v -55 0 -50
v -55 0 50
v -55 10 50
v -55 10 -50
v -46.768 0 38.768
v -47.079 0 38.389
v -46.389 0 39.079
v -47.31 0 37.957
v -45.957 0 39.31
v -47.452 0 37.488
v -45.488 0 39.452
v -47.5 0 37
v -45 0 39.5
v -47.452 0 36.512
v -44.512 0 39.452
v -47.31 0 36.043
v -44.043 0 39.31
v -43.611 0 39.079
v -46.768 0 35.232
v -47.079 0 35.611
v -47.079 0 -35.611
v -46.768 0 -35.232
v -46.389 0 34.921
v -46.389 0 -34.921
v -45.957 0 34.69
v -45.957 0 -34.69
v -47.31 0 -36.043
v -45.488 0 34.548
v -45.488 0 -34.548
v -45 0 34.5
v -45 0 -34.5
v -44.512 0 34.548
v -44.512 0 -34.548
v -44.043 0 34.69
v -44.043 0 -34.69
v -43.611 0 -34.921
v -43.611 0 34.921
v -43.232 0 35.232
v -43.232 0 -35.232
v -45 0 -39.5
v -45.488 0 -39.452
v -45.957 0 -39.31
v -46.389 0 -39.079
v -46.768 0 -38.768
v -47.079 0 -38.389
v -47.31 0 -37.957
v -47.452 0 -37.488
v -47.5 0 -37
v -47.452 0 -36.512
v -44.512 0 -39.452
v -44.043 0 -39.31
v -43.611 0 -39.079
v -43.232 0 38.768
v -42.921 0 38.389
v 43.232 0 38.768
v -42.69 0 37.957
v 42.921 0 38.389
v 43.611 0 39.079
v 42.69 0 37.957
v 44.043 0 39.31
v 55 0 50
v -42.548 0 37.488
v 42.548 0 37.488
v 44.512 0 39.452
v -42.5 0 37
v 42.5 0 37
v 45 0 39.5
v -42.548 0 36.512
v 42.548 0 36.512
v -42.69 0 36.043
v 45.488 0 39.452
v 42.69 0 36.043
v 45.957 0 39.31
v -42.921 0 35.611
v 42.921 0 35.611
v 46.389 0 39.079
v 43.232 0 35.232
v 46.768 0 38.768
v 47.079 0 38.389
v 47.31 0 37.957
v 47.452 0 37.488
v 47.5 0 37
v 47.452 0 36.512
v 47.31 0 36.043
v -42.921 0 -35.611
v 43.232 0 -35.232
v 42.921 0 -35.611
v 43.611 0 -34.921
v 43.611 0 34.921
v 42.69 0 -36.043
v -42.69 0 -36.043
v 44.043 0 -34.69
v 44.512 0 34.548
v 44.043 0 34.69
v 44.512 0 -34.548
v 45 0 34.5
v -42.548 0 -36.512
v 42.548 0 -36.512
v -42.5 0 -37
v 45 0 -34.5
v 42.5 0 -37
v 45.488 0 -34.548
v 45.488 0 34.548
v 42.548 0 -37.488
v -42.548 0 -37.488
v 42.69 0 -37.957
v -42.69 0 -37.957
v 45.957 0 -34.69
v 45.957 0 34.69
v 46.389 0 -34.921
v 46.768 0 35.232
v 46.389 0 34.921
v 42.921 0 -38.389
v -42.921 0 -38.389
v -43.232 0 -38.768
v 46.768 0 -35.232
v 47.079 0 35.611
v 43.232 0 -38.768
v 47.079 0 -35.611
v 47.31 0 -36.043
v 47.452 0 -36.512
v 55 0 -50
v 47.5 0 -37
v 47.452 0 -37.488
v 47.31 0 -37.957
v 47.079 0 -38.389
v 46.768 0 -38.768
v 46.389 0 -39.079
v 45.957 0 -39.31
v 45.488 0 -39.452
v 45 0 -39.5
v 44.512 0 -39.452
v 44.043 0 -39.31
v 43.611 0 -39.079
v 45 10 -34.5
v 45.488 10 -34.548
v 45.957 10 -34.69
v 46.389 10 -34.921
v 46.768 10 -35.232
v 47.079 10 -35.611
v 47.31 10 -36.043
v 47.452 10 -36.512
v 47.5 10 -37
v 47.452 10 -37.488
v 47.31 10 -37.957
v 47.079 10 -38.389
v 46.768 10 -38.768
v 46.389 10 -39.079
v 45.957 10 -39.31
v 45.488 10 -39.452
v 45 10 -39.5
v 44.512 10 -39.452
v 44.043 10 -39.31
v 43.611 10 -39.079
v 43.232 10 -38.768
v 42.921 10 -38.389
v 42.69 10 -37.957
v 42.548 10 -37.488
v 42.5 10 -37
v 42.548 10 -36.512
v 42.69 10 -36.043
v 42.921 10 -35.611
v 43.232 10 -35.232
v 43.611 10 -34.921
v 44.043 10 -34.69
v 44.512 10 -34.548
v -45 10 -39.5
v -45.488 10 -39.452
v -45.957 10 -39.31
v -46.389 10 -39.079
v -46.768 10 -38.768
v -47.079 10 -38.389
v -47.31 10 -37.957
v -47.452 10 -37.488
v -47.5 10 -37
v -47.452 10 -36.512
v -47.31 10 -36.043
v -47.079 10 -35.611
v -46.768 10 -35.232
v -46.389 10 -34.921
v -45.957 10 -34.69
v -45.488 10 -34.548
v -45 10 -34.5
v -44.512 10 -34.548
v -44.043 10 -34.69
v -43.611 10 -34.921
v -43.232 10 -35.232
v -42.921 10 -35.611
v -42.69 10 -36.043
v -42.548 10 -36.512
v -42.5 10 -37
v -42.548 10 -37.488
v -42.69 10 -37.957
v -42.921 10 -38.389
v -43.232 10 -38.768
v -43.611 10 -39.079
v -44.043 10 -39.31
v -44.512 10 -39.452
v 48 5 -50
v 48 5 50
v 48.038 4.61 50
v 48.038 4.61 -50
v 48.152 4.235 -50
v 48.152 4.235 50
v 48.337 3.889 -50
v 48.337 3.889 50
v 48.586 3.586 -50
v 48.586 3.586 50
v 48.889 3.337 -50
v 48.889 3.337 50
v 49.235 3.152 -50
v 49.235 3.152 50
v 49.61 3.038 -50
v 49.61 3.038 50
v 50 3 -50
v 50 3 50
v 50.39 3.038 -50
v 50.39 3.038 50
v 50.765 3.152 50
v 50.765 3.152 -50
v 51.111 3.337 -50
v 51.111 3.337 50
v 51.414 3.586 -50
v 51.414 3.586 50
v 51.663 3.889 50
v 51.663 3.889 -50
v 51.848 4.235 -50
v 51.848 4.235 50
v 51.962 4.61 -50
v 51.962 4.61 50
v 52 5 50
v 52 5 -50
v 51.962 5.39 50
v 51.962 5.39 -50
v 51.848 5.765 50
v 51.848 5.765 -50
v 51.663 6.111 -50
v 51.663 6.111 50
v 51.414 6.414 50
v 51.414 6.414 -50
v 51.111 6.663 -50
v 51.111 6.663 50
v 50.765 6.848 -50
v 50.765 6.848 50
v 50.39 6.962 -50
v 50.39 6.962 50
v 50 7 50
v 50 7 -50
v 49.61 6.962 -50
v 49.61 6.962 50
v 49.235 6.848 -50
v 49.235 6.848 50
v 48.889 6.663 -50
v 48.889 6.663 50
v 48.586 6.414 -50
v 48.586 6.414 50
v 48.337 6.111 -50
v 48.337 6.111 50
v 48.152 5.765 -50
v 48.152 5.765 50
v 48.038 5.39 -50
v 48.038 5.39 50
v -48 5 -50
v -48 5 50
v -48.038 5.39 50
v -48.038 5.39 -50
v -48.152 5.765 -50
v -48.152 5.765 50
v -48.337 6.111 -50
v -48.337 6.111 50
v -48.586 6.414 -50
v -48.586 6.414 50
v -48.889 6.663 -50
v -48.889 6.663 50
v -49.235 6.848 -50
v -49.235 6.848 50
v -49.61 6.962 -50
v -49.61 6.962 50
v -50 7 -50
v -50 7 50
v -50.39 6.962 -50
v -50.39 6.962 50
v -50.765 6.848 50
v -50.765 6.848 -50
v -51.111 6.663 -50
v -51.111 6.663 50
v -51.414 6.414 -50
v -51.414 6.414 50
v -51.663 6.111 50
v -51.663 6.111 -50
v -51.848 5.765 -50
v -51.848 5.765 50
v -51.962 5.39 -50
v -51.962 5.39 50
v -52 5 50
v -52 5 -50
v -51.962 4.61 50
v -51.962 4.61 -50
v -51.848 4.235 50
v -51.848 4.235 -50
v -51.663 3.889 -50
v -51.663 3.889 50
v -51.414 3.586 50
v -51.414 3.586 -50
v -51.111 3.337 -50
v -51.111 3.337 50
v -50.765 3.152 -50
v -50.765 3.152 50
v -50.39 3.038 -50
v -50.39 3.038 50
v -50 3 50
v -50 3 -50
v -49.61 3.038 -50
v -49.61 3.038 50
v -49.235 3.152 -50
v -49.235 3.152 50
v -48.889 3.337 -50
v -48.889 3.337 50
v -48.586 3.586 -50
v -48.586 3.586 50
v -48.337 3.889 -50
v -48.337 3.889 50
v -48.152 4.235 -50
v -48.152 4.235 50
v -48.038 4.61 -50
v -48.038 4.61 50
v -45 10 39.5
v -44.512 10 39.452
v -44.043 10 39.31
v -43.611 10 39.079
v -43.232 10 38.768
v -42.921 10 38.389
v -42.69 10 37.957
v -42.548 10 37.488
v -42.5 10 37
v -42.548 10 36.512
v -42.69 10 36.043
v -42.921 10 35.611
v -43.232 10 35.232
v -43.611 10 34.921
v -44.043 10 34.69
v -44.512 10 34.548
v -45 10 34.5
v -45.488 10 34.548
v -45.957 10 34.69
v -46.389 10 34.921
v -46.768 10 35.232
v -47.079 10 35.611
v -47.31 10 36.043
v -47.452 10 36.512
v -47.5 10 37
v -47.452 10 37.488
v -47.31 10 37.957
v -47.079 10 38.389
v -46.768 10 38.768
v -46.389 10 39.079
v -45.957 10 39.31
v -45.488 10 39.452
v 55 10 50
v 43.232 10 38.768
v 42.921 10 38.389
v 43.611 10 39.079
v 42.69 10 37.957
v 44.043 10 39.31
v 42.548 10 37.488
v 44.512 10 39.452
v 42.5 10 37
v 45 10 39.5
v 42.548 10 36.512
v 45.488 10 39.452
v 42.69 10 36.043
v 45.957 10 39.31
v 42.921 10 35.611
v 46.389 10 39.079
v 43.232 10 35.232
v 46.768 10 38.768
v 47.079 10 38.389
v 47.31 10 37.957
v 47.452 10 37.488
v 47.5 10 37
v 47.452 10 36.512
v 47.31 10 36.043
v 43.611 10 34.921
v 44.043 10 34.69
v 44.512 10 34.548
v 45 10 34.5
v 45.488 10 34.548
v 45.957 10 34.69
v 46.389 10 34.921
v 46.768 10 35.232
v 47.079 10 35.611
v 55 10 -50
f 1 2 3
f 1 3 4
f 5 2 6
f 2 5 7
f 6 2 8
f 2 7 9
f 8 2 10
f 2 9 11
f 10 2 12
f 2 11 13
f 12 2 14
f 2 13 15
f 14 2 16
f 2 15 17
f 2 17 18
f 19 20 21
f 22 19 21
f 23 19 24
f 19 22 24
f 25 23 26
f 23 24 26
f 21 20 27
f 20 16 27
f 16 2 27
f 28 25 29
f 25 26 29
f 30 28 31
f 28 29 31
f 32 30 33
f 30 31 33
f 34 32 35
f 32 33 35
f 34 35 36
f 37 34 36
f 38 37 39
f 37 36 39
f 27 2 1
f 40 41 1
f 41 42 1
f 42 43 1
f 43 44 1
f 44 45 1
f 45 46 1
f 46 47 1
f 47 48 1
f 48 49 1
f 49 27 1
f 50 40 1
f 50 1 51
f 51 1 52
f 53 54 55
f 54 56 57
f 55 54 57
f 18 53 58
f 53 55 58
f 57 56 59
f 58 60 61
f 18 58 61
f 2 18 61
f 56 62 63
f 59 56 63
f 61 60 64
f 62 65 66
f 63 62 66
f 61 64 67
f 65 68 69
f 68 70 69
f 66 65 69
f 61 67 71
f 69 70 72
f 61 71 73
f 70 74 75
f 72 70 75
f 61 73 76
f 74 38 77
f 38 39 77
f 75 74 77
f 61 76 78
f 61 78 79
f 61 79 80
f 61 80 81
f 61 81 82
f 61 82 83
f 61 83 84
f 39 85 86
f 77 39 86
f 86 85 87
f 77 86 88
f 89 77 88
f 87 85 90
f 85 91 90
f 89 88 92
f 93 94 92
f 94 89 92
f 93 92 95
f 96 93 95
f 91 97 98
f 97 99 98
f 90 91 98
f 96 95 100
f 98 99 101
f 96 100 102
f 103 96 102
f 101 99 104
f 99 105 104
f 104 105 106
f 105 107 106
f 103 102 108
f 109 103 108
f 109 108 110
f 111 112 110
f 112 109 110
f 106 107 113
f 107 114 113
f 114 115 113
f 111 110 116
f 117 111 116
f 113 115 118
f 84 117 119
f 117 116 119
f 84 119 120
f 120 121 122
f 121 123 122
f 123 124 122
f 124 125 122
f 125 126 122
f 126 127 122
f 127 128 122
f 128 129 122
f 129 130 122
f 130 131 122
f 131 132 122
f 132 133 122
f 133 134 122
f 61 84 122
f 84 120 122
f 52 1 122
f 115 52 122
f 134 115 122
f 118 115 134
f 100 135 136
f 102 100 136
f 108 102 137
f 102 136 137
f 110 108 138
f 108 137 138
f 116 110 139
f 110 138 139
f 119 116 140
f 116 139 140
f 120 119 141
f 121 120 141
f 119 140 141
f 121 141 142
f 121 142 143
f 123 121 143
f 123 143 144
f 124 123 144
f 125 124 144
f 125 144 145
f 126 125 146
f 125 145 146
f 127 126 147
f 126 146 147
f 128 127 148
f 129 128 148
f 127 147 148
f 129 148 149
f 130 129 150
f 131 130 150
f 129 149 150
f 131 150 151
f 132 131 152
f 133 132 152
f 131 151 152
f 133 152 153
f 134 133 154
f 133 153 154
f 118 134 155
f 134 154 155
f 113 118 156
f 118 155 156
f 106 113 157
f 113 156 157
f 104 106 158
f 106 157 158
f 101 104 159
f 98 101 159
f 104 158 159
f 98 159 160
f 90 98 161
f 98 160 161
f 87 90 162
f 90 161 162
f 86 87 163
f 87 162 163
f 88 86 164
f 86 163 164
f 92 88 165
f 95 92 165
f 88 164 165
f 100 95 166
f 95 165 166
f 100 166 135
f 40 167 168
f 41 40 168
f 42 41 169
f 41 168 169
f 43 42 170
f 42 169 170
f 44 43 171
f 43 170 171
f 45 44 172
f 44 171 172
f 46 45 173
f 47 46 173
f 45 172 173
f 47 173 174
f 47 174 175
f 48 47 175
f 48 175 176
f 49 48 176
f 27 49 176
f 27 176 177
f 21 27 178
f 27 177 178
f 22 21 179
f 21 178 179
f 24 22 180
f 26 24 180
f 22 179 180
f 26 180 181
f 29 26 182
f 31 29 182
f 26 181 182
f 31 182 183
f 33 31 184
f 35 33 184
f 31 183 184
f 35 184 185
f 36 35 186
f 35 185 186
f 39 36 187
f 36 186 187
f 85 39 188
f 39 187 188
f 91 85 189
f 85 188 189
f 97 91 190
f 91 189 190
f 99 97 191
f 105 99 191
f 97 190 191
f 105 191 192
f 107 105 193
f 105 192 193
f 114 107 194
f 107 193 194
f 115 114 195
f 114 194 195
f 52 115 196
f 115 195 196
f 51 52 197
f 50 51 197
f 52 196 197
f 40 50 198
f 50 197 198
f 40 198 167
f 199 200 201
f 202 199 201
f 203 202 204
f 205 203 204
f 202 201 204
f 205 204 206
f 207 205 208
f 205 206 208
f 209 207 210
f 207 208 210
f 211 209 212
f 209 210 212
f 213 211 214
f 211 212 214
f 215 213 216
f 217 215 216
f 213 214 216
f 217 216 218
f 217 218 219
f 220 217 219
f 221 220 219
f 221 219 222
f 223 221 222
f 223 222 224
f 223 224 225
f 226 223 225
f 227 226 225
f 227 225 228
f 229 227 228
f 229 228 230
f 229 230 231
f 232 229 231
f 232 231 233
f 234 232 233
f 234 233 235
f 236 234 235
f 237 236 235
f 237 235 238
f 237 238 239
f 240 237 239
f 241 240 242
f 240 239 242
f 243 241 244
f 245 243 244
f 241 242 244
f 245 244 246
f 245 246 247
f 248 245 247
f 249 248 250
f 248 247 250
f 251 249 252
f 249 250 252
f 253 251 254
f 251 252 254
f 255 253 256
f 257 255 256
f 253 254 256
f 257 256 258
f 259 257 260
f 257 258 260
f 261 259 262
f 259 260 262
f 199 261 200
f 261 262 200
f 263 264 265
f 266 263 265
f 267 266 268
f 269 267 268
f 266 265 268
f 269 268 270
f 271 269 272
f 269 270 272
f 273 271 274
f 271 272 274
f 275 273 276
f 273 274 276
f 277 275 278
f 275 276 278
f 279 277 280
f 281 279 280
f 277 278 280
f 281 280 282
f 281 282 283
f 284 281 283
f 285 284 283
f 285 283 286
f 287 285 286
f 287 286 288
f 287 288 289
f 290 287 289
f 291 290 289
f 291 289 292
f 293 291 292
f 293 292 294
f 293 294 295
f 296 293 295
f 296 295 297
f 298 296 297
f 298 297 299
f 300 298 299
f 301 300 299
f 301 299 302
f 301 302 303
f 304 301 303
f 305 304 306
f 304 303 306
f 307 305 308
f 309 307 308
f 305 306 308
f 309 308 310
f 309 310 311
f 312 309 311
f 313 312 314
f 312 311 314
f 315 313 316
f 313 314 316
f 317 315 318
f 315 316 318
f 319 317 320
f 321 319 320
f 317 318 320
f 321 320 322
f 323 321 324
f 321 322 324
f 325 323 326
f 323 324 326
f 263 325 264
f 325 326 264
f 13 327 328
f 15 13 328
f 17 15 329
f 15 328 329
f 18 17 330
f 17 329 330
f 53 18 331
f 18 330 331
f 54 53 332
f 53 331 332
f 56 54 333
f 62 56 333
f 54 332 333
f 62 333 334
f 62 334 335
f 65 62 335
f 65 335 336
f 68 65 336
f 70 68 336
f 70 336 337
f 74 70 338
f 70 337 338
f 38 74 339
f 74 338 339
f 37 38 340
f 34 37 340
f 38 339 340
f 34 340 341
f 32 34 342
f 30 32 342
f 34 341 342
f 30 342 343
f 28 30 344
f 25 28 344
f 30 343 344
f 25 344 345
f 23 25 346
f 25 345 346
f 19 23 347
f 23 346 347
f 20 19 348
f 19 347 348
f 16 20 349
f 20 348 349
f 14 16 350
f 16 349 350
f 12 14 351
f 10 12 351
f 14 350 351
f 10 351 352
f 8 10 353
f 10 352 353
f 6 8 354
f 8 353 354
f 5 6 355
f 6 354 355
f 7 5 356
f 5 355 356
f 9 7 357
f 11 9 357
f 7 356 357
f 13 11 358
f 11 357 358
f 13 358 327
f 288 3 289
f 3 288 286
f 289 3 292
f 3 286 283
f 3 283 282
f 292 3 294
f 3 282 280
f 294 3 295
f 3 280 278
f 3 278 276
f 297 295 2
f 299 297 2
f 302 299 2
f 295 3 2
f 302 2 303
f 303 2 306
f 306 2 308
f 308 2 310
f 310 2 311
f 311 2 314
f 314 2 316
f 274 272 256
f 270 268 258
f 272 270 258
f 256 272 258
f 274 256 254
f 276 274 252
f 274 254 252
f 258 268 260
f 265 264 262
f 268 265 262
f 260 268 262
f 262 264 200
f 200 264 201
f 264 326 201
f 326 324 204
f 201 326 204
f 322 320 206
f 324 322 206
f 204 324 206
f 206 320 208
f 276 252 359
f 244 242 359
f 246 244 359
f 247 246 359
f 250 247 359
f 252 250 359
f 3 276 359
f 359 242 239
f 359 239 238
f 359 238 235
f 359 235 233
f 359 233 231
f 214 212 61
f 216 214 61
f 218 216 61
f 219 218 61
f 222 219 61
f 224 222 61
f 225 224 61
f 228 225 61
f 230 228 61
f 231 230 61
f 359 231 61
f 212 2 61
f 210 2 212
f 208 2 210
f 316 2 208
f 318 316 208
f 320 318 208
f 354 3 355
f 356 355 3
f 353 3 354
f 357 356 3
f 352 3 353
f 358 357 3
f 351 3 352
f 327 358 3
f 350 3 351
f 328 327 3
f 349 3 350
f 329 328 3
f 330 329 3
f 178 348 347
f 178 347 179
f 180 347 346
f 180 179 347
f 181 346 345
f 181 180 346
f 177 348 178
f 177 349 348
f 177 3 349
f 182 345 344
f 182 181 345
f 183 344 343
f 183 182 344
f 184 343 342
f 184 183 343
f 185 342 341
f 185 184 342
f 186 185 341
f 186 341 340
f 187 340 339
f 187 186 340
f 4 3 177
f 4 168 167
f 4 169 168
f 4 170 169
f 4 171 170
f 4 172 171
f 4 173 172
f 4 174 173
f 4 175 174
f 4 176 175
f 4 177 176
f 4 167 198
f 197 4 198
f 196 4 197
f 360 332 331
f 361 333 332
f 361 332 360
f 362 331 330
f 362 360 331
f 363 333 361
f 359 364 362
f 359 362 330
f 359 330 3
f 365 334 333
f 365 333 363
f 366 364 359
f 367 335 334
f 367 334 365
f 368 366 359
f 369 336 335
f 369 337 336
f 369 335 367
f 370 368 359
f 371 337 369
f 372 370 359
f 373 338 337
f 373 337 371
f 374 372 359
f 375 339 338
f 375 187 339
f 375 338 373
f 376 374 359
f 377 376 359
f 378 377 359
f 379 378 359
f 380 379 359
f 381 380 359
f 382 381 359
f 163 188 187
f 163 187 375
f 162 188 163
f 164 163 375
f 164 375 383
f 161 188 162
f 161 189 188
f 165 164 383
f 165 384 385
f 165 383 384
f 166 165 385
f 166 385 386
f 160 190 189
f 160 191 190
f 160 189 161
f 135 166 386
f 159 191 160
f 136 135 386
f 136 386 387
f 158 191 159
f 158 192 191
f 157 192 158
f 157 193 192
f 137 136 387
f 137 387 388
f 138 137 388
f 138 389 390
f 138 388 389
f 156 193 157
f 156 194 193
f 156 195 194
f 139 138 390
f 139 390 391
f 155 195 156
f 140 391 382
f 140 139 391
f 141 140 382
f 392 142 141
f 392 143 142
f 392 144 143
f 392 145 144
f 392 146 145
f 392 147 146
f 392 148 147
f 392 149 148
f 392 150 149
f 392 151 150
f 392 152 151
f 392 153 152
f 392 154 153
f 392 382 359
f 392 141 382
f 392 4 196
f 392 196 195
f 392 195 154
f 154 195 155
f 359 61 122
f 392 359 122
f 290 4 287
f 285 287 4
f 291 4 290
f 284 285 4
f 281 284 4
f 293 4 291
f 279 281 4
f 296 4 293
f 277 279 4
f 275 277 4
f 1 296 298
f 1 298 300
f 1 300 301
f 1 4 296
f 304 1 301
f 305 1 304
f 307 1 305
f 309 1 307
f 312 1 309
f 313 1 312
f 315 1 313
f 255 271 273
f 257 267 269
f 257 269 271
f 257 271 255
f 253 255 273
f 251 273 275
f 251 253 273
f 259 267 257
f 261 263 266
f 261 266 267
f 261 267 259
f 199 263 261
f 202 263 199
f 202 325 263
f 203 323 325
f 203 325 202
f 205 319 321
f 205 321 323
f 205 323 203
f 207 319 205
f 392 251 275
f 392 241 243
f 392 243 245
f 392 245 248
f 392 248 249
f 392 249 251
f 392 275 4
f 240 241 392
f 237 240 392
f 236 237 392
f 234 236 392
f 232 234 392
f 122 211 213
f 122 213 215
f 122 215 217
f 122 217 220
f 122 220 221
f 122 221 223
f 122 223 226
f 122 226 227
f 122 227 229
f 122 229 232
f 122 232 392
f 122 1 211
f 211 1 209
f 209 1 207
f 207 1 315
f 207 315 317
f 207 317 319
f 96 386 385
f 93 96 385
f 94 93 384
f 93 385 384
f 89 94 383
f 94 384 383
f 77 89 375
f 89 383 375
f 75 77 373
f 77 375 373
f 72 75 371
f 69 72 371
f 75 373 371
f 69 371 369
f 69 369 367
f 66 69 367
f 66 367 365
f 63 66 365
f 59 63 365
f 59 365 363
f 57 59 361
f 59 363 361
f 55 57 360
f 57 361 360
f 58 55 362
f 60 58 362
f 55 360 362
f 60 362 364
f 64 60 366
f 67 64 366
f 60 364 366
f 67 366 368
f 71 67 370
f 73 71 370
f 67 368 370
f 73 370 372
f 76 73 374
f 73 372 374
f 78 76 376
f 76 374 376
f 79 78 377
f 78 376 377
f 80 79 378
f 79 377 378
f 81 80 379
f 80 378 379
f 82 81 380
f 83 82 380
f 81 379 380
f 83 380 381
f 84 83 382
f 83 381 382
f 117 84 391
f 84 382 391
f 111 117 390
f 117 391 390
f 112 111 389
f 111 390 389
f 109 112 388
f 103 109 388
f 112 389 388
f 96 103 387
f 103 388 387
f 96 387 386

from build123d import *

# Parameters (mm, degrees)
SKETCH1_W           = 110
SKETCH1_H           = 100
BOSS_EXTRUDE1_DEPTH = 10
SKETCH2_R           = 2
CUT_EXTRUDE1_DEPTH  = 115.564392374
SKETCH3_R           = 2.5
CUT_EXTRUDE2_DEPTH  = 10


with BuildPart() as part:
    # Sketch1 → Boss-Extrude1 (new body)
    with BuildSketch(Plane(origin=(0, 0, 0), x_dir=(1, 0, 0), z_dir=(0, 1, 0))):
        Rectangle(SKETCH1_W, SKETCH1_H)
    extrude(amount=BOSS_EXTRUDE1_DEPTH)

    # Sketch2 → Cut-Extrude1 (cut, through all)
    with BuildSketch(Plane.XY.offset(50)):
        with Locations((-50, 5)):
            Circle(SKETCH2_R)
        with Locations(Location((50, 5, 0), (0, 0, 180))):
            Circle(SKETCH2_R)
    extrude(amount=-CUT_EXTRUDE1_DEPTH, mode=Mode.SUBTRACT)

    # Sketch3 → Cut-Extrude2 (cut)
    with BuildSketch(Plane(origin=(0, 10, 0), x_dir=(1, 0, 0), z_dir=(0, 1, 0))):
        with Locations(Location((-45, -37, 0), (0, 0, 270))):
            Circle(SKETCH3_R)
        with Locations(Location((45, -37, 0), (0, 0, 90))):
            Circle(SKETCH3_R)
        with Locations(Location((45, 37, 0), (0, 0, 270))):
            Circle(SKETCH3_R)
        with Locations(Location((-45, 37, 0), (0, 0, 90))):
            Circle(SKETCH3_R)
    extrude(amount=-CUT_EXTRUDE2_DEPTH, mode=Mode.SUBTRACT)


solid = part.part
